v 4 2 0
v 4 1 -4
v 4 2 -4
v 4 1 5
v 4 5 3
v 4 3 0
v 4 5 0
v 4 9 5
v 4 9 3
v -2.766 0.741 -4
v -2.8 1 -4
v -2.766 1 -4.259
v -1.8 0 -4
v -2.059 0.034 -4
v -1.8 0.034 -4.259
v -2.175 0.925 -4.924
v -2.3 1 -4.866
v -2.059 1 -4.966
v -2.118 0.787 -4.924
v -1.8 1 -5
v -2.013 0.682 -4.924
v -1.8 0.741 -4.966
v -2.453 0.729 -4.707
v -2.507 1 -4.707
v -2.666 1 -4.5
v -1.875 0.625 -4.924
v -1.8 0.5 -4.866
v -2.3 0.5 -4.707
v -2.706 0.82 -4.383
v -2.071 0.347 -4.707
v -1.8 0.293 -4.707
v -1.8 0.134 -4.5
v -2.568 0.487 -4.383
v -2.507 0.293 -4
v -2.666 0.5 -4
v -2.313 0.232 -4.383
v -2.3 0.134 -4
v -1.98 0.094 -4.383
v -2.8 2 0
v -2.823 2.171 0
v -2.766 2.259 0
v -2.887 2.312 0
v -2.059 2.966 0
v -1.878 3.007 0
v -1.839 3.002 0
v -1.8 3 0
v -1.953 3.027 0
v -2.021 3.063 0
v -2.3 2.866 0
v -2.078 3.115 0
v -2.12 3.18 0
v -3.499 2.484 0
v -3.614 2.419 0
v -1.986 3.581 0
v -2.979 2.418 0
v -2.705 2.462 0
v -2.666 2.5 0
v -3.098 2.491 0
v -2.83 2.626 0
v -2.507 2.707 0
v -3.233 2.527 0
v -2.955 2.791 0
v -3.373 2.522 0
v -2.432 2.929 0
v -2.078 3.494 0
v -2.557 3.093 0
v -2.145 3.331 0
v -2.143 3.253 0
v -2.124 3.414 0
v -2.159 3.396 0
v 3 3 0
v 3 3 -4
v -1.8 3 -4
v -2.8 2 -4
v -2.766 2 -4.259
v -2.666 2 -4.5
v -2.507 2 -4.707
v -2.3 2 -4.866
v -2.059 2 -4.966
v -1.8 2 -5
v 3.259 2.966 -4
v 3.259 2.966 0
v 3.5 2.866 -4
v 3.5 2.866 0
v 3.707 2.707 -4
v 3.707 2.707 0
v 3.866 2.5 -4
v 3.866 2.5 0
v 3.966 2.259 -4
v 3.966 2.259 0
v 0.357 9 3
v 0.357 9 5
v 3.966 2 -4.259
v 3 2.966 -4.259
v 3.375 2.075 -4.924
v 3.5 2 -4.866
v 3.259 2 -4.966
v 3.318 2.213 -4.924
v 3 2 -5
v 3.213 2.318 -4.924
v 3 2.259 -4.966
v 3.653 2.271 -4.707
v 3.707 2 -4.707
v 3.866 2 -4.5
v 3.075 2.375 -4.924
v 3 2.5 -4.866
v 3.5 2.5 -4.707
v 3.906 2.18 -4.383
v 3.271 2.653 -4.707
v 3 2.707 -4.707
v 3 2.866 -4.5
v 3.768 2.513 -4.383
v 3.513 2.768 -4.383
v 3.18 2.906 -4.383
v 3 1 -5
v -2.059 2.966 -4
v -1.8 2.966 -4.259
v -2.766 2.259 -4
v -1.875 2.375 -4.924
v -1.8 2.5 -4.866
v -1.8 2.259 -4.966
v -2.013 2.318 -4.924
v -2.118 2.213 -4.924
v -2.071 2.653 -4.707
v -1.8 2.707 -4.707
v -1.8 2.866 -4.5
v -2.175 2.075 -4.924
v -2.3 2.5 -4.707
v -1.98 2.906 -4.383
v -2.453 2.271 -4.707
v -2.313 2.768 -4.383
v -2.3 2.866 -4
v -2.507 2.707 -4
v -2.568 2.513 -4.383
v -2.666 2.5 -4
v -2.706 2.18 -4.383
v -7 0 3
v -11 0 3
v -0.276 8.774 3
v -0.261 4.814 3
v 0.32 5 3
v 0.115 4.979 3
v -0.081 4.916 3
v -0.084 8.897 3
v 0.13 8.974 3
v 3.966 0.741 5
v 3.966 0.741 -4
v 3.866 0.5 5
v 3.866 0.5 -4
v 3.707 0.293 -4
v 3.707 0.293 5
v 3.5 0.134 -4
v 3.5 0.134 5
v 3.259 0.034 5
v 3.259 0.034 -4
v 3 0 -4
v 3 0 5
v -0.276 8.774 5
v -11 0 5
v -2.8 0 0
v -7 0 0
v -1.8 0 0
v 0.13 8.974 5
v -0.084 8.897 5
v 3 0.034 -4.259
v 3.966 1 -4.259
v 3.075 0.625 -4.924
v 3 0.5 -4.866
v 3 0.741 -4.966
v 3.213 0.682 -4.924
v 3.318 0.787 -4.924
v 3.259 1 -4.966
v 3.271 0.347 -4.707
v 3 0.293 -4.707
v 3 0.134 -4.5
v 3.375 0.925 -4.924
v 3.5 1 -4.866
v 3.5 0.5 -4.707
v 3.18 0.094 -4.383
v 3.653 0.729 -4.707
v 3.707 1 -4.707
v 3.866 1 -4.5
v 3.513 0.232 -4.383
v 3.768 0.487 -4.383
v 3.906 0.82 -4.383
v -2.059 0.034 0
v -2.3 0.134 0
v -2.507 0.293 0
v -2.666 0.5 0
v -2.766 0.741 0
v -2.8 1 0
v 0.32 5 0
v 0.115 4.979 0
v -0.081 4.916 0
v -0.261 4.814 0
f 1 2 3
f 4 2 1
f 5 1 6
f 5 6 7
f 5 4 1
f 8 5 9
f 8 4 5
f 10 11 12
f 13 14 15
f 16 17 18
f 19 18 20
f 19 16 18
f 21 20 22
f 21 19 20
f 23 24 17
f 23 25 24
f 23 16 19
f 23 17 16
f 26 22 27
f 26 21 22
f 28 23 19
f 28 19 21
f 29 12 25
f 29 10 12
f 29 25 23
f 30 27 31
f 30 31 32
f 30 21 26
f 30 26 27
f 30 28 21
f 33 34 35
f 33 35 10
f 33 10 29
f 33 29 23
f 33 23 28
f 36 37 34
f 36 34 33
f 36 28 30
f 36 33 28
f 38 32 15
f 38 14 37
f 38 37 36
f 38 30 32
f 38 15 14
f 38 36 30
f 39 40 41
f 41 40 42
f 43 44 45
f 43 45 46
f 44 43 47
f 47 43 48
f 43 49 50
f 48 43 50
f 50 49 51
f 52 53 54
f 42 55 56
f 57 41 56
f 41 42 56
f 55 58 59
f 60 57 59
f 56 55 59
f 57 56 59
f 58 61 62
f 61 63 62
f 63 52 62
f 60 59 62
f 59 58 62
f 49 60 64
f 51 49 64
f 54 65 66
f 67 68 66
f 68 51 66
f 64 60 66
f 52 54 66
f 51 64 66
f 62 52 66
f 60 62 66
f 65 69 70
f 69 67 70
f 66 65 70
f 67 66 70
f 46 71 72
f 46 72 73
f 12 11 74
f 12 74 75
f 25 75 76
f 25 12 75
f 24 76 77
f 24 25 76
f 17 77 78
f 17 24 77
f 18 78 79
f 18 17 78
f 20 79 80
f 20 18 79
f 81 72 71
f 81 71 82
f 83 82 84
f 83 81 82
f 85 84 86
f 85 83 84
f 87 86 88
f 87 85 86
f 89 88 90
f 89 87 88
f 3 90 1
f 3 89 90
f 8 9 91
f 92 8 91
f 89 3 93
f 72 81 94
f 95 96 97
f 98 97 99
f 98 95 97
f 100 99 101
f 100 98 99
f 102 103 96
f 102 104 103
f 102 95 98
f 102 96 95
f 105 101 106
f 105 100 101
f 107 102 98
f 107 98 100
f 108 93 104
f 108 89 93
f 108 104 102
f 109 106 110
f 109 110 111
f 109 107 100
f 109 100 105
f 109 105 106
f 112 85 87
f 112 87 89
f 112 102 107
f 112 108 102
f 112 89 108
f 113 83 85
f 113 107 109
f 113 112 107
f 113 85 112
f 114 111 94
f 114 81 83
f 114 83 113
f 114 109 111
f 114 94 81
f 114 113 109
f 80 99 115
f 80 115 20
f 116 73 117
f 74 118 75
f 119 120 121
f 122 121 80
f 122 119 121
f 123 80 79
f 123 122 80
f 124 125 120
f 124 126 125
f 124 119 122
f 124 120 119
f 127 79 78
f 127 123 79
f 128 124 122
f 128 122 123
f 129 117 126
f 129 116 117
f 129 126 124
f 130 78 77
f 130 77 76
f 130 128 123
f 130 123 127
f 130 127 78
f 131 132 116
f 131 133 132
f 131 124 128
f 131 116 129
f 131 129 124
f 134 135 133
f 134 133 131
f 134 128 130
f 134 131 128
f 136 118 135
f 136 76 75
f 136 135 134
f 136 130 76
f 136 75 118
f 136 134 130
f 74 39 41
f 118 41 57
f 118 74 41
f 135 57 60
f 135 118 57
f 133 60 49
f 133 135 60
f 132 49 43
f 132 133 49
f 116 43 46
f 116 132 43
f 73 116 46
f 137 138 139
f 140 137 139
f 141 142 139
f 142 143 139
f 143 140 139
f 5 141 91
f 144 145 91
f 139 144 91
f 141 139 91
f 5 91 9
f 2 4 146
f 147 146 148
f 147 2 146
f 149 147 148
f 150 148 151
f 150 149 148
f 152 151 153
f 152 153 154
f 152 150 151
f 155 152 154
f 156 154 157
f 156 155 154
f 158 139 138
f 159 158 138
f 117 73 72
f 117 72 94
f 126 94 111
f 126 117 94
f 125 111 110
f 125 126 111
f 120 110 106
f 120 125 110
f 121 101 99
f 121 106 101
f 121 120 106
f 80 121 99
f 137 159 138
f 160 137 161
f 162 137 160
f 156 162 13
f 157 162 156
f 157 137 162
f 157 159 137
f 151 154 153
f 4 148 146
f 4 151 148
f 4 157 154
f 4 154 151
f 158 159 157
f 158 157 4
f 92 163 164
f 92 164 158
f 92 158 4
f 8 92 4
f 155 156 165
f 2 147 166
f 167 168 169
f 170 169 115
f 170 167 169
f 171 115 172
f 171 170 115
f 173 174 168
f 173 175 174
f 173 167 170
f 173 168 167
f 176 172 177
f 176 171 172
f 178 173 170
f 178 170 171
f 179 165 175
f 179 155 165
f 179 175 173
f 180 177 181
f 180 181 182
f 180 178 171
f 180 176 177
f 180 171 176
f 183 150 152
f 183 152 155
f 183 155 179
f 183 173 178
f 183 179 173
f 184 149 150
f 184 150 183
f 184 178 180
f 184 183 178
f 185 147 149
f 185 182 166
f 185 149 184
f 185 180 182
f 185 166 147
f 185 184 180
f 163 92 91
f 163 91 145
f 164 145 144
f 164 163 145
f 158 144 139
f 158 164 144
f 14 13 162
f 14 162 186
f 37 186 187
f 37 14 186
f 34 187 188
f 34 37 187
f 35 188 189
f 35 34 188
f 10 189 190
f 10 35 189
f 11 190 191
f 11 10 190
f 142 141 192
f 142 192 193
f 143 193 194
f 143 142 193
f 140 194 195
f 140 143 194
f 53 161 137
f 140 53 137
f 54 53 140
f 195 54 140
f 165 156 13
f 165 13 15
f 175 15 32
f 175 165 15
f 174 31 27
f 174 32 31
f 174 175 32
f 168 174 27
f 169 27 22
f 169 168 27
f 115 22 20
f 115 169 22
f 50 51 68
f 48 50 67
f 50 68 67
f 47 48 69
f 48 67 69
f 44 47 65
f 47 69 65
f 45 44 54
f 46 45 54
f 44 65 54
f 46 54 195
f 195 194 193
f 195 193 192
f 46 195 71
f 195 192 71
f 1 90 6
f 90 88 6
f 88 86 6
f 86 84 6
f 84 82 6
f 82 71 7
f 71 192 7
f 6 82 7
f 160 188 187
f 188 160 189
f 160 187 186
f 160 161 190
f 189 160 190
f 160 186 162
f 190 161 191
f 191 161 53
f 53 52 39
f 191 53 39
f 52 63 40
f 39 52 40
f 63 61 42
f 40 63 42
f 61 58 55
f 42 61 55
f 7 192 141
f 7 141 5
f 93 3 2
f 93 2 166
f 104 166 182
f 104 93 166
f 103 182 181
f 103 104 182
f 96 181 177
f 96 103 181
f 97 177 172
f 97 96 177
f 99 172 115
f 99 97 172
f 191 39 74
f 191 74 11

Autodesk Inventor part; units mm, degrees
ref_plane "YZ Plane" through (0, 0, 0) normal (1, 0, 0) x (0, 1, 0)
ref_plane "XZ Plane" through (0, 0, 0) normal (0, 1, 0) x (-1, 0, 0)
ref_plane "XY Plane" through (0, 0, 0) normal (0, 0, 1) x (1, 0, 0)
sketch "Эскиз1" plane through (0, 0, 0) normal (0, 0, 1) x (1, 0, 0)
  line L0 (0, 0) -> (0, 5)
  line L1 (0, 0) -> (-7, 0)
  line L2 (-7, 0) -> (0, 5)
  line L3 (0, 5) -> (4, 5)
  line L4 (4, 5) -> (4, 0)
  line L5 (4, 0) -> (0, 0)
  dimension "d0" = 5
  dimension "d1" = 7
  dimension "d2" = 4
extrude "Выдавливание1" add sketch "Эскиз1" along normal blind 3
sketch "Эскиз2" plane through (0, 0, 3) normal (0, 0, 1) x (1, 0, 0)
  line L0 (-7, 0) -> (4, 0) projected
  line L1 (-7, 0) -> (-11, 0)
  line L2 (4, 5) -> (0, 5) projected
  line L3 (0, 5) -> (0, 9)
  line L4 (0, 9) -> (-11, 0)
  line L5 (4, 5) -> (4, 9)
  line L6 (4, 9) -> (0, 9)
  line L7 (4, 0) -> (4, 5) projected
  line L8 (4, 5) -> (4, 0)
  line L9 (4, 0) -> (-7, 0)
  point P0 (0, 0)
  dimension "d5" = 4
  dimension "d6" = 4
extrude "Выдавливание2" add sketch "Эскиз2" along normal blind 2
sketch "Эскиз3" plane through (0, 0, 0) normal (0, 0, -1) x (-1, 0, 0)
  line L0 (-4, 0) -> (-4, 5) projected
  line L1 (-4, 0) -> (-4, 3)
  line L2 (-4, 3) -> (2.8, 3)
  line L3 (0, 5) -> (7, 0) projected
  line L4 (7, 0) -> (-4, 0) projected
  line L5 (2.8, 3) -> (7, 0)
  line L6 (7, 0) -> (-4, 0)
  line L7 (2.8, 3) -> (2.8, 0)
  point P0 (0, 0)
  dimension "d9" = 3
extrude "Выдавливание3" add sketch "Эскиз3" along normal blind 5 contours L0 L2 L7 L4
fillet "Сопряжение1" radius 1 10 edges at (4, 3, -2.5) (4, 0, 0) (-2.8, 0, -2.5) (-2.8, 3, -2.5) (0, 5, 1.5) (0, 9, 4) (0.6, 3, -5) (4, 1.5, -5) (0.6, 0, -5) (-2.8, 1.5, -5)
properties part number "разделитель"
